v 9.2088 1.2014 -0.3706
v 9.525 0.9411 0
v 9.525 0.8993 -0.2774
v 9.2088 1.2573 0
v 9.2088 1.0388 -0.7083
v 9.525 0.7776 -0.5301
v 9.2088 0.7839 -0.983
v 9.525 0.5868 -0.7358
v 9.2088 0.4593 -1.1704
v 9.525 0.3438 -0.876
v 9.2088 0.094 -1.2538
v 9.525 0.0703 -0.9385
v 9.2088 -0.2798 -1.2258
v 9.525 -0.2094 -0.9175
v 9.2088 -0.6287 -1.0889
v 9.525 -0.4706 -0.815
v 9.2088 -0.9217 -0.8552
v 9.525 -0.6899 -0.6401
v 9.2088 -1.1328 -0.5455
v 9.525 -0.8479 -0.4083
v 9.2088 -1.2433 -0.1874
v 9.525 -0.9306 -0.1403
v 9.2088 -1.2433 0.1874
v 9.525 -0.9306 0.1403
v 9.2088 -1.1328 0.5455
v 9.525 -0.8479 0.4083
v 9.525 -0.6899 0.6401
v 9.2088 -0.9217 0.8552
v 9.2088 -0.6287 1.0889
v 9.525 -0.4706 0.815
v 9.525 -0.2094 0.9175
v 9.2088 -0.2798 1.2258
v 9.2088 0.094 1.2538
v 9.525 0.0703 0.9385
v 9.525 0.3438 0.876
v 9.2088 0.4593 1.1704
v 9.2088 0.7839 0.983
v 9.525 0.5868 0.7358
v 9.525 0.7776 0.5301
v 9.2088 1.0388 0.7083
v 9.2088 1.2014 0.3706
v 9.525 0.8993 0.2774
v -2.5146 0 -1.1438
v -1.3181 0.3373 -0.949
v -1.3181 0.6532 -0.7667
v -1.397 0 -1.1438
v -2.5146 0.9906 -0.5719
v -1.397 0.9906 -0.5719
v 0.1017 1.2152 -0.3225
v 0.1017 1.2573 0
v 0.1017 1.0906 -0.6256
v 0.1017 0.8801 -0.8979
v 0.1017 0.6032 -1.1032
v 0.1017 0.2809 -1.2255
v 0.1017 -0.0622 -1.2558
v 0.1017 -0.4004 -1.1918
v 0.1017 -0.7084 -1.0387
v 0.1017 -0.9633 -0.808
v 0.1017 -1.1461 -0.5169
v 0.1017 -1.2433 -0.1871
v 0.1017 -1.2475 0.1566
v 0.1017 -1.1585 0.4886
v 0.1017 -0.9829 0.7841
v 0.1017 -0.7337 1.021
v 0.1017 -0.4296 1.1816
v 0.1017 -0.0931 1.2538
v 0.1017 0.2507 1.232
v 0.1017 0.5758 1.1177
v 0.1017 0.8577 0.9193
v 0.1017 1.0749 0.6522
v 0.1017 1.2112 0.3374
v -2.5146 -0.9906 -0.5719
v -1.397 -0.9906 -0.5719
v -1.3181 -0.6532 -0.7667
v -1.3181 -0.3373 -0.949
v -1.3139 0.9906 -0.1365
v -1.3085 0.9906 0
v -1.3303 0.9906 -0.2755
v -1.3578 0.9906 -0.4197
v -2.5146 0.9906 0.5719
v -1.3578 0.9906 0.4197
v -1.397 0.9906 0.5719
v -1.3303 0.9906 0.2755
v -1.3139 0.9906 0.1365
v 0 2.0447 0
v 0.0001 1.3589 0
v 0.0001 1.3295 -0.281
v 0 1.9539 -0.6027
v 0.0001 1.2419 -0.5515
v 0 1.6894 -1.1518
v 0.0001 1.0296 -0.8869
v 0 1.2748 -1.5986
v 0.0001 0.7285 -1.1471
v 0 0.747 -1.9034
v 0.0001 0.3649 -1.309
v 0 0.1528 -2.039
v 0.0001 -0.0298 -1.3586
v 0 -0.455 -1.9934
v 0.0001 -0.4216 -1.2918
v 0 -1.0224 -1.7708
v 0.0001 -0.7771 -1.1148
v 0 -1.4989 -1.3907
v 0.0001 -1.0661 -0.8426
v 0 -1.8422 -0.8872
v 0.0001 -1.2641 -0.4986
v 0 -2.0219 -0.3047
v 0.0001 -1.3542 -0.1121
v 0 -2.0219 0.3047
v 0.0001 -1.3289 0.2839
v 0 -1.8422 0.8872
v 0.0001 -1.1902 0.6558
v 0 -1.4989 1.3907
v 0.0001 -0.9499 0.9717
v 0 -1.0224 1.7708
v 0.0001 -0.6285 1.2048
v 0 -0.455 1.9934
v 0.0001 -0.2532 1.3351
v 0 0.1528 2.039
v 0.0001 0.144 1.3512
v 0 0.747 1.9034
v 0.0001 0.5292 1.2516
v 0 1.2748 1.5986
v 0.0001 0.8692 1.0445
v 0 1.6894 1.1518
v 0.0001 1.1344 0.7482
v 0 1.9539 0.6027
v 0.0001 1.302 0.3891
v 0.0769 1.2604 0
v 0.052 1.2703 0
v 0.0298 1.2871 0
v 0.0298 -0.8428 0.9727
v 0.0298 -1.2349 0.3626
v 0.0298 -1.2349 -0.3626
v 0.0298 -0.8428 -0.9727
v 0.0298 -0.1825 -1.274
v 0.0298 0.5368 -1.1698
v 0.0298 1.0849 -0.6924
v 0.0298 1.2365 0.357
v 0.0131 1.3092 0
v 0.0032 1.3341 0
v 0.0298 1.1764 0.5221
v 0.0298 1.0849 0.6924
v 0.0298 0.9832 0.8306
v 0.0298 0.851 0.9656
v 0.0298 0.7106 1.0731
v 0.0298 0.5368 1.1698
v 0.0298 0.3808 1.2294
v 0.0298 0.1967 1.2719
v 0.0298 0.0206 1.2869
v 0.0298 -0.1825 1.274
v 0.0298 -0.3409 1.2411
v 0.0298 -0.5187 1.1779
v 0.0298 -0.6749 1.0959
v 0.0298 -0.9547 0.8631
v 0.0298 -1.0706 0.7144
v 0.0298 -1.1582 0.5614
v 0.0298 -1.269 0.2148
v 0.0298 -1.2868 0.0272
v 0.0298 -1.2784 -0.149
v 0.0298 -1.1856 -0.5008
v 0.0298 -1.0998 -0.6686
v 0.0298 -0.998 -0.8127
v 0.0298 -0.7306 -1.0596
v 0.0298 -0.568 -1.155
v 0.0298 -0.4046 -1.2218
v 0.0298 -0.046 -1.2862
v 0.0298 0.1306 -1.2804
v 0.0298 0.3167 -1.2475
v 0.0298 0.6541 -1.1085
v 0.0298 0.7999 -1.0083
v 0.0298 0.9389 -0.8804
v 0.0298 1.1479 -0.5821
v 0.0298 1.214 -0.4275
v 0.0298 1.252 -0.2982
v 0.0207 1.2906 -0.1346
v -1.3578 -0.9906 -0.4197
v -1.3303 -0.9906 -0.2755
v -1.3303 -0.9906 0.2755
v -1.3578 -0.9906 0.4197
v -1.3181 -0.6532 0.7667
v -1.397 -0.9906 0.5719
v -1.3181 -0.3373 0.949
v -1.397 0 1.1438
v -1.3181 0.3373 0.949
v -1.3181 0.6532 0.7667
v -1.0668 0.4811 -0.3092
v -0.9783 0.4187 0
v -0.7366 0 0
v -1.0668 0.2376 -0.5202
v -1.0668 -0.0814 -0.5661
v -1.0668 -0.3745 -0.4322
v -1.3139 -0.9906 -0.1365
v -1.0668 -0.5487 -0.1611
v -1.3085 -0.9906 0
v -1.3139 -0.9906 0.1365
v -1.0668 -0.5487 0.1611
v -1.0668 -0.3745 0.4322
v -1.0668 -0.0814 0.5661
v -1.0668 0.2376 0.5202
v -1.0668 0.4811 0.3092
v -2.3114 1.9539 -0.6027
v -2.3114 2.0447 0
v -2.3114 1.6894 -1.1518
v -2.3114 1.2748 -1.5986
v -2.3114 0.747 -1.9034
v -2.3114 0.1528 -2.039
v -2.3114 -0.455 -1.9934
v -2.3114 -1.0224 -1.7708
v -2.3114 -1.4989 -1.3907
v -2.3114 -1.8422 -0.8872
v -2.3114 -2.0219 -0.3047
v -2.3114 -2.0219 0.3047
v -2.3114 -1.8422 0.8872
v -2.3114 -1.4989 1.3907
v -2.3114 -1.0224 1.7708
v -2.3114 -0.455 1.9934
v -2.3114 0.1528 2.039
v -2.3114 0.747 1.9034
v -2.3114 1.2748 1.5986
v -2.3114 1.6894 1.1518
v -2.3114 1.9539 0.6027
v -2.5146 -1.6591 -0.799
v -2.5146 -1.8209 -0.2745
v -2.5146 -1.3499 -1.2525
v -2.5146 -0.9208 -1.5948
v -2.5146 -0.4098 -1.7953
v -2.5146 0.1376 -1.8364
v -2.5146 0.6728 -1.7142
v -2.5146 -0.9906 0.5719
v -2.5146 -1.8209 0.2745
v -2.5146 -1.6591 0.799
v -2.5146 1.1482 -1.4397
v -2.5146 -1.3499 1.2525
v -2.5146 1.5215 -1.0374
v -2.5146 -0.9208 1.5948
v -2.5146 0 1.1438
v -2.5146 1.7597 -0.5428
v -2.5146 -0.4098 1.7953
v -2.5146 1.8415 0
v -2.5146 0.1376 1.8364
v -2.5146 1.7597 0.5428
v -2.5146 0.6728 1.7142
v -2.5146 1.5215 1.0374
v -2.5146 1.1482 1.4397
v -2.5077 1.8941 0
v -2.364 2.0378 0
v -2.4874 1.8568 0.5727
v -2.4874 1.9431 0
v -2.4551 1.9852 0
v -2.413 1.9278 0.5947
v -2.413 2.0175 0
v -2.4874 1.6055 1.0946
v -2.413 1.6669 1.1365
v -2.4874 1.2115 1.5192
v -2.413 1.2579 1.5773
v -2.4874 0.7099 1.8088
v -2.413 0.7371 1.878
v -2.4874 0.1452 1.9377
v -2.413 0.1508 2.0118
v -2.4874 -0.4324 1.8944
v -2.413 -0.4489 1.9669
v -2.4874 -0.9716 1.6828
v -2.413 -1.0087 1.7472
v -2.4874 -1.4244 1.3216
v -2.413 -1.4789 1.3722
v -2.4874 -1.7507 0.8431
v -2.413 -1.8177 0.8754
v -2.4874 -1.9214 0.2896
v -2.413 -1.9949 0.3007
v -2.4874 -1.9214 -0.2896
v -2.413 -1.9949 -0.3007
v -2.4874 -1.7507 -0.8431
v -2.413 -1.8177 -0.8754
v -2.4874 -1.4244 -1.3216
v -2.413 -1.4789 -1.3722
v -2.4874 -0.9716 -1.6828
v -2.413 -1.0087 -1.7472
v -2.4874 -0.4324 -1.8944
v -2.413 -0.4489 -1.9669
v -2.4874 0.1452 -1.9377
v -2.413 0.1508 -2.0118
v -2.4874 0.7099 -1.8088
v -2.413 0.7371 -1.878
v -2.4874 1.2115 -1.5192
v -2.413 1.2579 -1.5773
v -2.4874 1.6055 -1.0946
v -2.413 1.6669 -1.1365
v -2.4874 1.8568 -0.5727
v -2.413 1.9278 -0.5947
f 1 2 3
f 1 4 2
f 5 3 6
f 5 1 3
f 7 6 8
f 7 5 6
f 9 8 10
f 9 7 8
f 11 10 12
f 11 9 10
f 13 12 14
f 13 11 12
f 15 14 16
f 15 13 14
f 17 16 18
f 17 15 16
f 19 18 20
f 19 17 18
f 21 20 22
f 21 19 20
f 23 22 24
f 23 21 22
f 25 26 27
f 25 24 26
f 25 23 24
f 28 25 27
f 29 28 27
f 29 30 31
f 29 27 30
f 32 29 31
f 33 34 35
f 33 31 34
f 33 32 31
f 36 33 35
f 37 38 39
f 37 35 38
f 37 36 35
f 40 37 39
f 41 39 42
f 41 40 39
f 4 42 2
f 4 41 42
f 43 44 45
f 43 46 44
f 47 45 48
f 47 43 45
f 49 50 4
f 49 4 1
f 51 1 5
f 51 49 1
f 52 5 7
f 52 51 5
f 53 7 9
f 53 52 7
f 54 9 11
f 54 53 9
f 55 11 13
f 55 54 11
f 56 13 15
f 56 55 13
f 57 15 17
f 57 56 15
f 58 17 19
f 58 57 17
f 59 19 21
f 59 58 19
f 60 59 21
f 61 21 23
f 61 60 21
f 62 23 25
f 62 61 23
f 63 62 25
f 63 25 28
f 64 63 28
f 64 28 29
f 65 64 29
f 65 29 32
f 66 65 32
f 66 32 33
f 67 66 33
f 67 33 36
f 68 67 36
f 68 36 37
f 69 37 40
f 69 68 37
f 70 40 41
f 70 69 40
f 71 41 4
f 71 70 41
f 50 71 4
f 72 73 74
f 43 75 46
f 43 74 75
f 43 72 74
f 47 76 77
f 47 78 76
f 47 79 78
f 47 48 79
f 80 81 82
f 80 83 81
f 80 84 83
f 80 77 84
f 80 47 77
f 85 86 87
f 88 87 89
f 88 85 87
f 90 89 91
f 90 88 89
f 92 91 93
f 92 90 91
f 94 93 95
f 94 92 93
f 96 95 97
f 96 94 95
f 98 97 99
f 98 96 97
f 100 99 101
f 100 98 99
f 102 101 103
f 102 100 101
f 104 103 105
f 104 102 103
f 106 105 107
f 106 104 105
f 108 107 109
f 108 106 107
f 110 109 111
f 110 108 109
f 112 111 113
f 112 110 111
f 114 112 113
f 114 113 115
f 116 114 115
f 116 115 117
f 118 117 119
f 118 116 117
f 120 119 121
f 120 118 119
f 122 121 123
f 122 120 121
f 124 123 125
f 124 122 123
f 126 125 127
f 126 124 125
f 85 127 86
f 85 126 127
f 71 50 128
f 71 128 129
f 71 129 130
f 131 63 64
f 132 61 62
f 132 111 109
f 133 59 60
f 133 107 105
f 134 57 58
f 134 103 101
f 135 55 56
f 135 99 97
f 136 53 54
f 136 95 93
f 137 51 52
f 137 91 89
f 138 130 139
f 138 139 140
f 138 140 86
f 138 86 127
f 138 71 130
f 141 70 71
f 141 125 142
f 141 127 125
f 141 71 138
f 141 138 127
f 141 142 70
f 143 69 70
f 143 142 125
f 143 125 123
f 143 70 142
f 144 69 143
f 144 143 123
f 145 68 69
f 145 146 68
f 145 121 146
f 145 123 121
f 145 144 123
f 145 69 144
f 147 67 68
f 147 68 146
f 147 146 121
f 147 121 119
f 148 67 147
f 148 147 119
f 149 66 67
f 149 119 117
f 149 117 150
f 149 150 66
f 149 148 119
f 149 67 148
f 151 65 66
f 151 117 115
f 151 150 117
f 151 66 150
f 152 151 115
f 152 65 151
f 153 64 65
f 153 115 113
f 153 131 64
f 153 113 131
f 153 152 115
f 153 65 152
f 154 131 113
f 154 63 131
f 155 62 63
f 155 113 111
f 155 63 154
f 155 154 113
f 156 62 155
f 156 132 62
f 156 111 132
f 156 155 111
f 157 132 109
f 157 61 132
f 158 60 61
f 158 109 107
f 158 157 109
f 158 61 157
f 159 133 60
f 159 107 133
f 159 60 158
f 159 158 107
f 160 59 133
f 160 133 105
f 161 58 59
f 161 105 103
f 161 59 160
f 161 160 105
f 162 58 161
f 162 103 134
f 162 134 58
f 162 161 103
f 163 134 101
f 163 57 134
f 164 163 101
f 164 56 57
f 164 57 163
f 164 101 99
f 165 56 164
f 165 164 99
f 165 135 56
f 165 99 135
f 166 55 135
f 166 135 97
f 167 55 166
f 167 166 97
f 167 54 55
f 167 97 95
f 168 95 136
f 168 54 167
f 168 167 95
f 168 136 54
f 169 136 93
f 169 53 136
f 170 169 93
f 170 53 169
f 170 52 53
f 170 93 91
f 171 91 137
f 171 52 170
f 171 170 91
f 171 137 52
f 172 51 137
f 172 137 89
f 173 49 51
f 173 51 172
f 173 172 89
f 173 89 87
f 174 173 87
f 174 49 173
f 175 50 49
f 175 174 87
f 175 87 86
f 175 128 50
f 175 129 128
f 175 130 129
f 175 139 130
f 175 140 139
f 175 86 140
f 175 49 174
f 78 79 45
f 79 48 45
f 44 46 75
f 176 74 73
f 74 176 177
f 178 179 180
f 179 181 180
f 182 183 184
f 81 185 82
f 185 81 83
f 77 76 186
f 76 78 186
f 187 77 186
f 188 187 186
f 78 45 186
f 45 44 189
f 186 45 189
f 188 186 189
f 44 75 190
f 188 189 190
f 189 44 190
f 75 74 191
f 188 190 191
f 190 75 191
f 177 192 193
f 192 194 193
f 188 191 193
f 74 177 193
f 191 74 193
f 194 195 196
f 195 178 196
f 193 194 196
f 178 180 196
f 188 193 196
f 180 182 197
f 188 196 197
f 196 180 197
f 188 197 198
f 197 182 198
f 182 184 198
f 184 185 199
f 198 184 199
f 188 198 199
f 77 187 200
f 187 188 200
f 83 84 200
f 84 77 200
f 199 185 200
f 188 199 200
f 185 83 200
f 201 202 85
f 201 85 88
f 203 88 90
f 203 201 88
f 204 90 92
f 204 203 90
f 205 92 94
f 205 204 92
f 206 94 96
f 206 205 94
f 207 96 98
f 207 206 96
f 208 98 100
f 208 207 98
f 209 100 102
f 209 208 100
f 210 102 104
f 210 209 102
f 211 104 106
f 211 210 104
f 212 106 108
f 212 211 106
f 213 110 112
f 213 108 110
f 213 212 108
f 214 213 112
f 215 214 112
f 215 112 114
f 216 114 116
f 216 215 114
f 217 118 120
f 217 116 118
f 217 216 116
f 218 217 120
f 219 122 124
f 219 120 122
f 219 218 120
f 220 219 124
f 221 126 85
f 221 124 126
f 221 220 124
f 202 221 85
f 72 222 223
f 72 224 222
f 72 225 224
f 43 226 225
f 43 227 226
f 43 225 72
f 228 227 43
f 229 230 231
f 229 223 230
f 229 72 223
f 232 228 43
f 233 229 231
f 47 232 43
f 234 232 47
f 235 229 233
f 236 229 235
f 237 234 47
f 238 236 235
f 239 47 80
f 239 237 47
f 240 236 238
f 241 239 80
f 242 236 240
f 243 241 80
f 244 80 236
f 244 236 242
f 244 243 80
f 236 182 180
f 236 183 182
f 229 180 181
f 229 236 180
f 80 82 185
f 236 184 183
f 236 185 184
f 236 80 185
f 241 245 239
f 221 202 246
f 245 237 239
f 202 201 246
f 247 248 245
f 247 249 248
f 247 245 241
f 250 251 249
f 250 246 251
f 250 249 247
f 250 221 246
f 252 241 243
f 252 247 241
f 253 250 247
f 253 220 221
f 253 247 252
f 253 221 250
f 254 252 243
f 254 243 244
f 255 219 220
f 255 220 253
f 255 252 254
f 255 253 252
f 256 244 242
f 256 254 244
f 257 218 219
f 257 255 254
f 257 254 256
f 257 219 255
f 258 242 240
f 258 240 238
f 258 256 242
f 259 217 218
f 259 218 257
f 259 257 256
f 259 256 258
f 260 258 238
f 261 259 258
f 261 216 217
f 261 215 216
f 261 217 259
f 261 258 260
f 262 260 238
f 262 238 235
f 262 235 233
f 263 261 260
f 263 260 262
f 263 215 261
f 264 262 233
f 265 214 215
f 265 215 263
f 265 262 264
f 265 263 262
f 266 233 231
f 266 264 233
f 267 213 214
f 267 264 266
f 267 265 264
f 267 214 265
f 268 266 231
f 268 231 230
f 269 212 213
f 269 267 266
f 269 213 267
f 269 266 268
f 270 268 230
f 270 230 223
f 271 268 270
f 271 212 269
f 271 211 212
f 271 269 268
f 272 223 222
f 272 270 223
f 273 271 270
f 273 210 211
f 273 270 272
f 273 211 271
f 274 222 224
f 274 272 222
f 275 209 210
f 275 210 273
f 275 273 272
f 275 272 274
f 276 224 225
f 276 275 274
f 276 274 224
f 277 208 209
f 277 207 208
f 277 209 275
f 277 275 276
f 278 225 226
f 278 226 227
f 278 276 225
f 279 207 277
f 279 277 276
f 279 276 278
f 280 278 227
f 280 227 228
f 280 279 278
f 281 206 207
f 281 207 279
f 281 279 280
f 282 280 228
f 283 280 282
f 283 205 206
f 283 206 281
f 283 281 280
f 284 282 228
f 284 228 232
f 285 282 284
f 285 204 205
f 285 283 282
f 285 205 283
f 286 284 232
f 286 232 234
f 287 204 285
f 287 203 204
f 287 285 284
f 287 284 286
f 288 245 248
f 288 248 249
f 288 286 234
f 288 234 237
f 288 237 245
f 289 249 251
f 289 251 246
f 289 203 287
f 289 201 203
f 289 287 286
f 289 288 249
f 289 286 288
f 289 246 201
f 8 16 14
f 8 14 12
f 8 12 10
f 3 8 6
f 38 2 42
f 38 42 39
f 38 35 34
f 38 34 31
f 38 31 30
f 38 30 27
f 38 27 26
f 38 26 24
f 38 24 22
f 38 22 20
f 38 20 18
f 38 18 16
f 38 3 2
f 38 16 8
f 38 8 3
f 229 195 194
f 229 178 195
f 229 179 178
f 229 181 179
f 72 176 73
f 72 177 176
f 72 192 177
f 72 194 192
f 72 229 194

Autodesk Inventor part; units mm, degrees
ref_plane "YZ Plane" through (0, 0, 0) normal (1, 0, 0) x (0, 1, 0)
ref_plane "XZ Plane" through (0, 0, 0) normal (0, 1, 0) x (-1, 0, 0)
sketch "Sketch1" plane through (0, 0, 0) normal (0, 0, 1) x (1, 0, 0)
  line L0 (-0.7366, 0) -> (9.525, 0)
  line L1 (9.525, 0) -> (9.525, 1.2573)
  line L2 (9.525, 1.2573) -> (1.323, 1.2573)
  line L3 (1.323, 1.2573) -> (0.0001, 1.2573)
  line L4 (0.0001, 1.2573) -> (0, 1.2573)
  line L5 (0, 1.2573) -> (0, 2.0447)
  line L6 (0, 2.0447) -> (-2.5146, 2.0447)
  line L7 (-2.5146, 2.0447) -> (-2.5146, 1.1438)
  line L8 (-2.5146, 1.1438) -> (-1.397, 1.1438)
  line L9 (-1.397, 1.1438) -> (-0.7366, 0)
  line L10 (-4.9225, 0) -> (11.9329, 0) projected
  line L11 (0, -0.4089) -> (0, 2.4536) projected
  line L12 (1.323, 1.2573) -> (0, 1.2573) construction
  dimension "d1" = 8.202
  dimension "d2" = 1.3229
  dimension "d3" = 2.5146
  dimension "d4" = 1.1176
  dimension "d5" = 60
  dimension "d6" = 2.5146
  dimension "d7" = 2.5146
  dimension "d8" = 2.2877
  dimension "d9" = 4.0894
  dimension "d26" = 9.525
revolve "Body" add sketch "Sketch1" angle 360 about axis through (-0.7366, 0, 0) along (1, 0, 0)
sketch "Sketch2" plane through (-2.5146, 0, 0) normal (-1, 0, 0) x (0, 0, 1)
  circle A0 centre (0, 0) radius 1.1438 projected
  line L0 (0, -2.8626) -> (0, 2.8626) projected
  line L1 (-2.8626, 0) -> (2.8626, 0) projected
  line L2 (1.1438, 0) -> (0.5719, -0.9906)
  line L3 (0.5719, -0.9906) -> (-0.5719, -0.9906)
  line L4 (-0.5719, -0.9906) -> (-1.1438, 0)
  line L5 (-1.1438, 0) -> (-0.5719, 0.9906)
  line L6 (-0.5719, 0.9906) -> (0.5719, 0.9906)
  line L7 (0.5719, 0.9906) -> (1.1438, 0)
  point P0 (0, 0)
extrude "Slot" add sketch "Sketch2" against normal up to next contours L7 A0 | A0 L2 | L6 L0 A0 | A0 L0 L3 | L0 L6 A0 | A0 L3 L0 | L4 A0 | A0 L5
fillet "Fillet1" radius 0.2032 1 edges at (-2.5146, -2.0447, 0)
thread "Thread" size "3-48 UNC" class "2A" standard "ANSI Unified Screw Threads" length 8.202
chamfer "Chamfer1" distance 0.3162 distance2 0.3162 1 edges at (9.525, -1.2573, 0) measured on face at (9.525, 0.2955, 0.1278)
ref_plane "Work Plane1" through (29, 0, 0) normal (0, -1, 0) x (1, 0, 0)
fillet "Fillet2" radius 0.1016 1 edges at (0.0001, -1.2573, 0)
equation "\"d1\" = GEL"
equation "\"d3\" = KOH"
equation "\"d4\" = INTI"
equation "\"d6\" = GD"
equation "\"d7\" = BDM"
equation "\"d8\" = 1.1547 * SW"
equation "\"d9\" = KOD"
equation "\"d26\" = NLG"
equation "\"d30\" = R"
equation "\"d17\" = RR"
equation "\"d13\" = GEL"
equation "\"d15\" = -0.5 * SPD + 0.5 * GD"
equation "\"d16\" = GUL"
equation "\"GD\" = 2.5146"
equation "\"NLG\" = 9.525"
equation "\"GEL\" = 8.20197"
equation "\"KOD\" = 4.0894"
equation "\"KOH\" = 2.5146"
equation "\"INTI\" = 1.1176"
equation "\"GAL\" = 1.32283"
equation "\"GUL\" = 0.31623"
equation "\"BDM\" = 2.5146"
equation "\"SW\" = 1.9812"
equation "\"RR\" = 0.2032"
equation "\"SPD\" = 1.88214"
equation "\"R\" = 0.1016"
equation "\"PHH\" = 0.0762"
equation "\"GD1\" = SPD"
equation "\"THREADDIA\" = 2.5146"
equation "\"FAWI\" = 45deg"
equation "\"KOH1\" = 2.2606"
equation "\"NND\" = 2.5146"
equation "\"TOA\" = 30deg"
equation "\"E0\" = 1.155 * SW"
properties part number "ANSI B18.3 - No. 3 - 48 UNC - 3/8 HS HCS"
